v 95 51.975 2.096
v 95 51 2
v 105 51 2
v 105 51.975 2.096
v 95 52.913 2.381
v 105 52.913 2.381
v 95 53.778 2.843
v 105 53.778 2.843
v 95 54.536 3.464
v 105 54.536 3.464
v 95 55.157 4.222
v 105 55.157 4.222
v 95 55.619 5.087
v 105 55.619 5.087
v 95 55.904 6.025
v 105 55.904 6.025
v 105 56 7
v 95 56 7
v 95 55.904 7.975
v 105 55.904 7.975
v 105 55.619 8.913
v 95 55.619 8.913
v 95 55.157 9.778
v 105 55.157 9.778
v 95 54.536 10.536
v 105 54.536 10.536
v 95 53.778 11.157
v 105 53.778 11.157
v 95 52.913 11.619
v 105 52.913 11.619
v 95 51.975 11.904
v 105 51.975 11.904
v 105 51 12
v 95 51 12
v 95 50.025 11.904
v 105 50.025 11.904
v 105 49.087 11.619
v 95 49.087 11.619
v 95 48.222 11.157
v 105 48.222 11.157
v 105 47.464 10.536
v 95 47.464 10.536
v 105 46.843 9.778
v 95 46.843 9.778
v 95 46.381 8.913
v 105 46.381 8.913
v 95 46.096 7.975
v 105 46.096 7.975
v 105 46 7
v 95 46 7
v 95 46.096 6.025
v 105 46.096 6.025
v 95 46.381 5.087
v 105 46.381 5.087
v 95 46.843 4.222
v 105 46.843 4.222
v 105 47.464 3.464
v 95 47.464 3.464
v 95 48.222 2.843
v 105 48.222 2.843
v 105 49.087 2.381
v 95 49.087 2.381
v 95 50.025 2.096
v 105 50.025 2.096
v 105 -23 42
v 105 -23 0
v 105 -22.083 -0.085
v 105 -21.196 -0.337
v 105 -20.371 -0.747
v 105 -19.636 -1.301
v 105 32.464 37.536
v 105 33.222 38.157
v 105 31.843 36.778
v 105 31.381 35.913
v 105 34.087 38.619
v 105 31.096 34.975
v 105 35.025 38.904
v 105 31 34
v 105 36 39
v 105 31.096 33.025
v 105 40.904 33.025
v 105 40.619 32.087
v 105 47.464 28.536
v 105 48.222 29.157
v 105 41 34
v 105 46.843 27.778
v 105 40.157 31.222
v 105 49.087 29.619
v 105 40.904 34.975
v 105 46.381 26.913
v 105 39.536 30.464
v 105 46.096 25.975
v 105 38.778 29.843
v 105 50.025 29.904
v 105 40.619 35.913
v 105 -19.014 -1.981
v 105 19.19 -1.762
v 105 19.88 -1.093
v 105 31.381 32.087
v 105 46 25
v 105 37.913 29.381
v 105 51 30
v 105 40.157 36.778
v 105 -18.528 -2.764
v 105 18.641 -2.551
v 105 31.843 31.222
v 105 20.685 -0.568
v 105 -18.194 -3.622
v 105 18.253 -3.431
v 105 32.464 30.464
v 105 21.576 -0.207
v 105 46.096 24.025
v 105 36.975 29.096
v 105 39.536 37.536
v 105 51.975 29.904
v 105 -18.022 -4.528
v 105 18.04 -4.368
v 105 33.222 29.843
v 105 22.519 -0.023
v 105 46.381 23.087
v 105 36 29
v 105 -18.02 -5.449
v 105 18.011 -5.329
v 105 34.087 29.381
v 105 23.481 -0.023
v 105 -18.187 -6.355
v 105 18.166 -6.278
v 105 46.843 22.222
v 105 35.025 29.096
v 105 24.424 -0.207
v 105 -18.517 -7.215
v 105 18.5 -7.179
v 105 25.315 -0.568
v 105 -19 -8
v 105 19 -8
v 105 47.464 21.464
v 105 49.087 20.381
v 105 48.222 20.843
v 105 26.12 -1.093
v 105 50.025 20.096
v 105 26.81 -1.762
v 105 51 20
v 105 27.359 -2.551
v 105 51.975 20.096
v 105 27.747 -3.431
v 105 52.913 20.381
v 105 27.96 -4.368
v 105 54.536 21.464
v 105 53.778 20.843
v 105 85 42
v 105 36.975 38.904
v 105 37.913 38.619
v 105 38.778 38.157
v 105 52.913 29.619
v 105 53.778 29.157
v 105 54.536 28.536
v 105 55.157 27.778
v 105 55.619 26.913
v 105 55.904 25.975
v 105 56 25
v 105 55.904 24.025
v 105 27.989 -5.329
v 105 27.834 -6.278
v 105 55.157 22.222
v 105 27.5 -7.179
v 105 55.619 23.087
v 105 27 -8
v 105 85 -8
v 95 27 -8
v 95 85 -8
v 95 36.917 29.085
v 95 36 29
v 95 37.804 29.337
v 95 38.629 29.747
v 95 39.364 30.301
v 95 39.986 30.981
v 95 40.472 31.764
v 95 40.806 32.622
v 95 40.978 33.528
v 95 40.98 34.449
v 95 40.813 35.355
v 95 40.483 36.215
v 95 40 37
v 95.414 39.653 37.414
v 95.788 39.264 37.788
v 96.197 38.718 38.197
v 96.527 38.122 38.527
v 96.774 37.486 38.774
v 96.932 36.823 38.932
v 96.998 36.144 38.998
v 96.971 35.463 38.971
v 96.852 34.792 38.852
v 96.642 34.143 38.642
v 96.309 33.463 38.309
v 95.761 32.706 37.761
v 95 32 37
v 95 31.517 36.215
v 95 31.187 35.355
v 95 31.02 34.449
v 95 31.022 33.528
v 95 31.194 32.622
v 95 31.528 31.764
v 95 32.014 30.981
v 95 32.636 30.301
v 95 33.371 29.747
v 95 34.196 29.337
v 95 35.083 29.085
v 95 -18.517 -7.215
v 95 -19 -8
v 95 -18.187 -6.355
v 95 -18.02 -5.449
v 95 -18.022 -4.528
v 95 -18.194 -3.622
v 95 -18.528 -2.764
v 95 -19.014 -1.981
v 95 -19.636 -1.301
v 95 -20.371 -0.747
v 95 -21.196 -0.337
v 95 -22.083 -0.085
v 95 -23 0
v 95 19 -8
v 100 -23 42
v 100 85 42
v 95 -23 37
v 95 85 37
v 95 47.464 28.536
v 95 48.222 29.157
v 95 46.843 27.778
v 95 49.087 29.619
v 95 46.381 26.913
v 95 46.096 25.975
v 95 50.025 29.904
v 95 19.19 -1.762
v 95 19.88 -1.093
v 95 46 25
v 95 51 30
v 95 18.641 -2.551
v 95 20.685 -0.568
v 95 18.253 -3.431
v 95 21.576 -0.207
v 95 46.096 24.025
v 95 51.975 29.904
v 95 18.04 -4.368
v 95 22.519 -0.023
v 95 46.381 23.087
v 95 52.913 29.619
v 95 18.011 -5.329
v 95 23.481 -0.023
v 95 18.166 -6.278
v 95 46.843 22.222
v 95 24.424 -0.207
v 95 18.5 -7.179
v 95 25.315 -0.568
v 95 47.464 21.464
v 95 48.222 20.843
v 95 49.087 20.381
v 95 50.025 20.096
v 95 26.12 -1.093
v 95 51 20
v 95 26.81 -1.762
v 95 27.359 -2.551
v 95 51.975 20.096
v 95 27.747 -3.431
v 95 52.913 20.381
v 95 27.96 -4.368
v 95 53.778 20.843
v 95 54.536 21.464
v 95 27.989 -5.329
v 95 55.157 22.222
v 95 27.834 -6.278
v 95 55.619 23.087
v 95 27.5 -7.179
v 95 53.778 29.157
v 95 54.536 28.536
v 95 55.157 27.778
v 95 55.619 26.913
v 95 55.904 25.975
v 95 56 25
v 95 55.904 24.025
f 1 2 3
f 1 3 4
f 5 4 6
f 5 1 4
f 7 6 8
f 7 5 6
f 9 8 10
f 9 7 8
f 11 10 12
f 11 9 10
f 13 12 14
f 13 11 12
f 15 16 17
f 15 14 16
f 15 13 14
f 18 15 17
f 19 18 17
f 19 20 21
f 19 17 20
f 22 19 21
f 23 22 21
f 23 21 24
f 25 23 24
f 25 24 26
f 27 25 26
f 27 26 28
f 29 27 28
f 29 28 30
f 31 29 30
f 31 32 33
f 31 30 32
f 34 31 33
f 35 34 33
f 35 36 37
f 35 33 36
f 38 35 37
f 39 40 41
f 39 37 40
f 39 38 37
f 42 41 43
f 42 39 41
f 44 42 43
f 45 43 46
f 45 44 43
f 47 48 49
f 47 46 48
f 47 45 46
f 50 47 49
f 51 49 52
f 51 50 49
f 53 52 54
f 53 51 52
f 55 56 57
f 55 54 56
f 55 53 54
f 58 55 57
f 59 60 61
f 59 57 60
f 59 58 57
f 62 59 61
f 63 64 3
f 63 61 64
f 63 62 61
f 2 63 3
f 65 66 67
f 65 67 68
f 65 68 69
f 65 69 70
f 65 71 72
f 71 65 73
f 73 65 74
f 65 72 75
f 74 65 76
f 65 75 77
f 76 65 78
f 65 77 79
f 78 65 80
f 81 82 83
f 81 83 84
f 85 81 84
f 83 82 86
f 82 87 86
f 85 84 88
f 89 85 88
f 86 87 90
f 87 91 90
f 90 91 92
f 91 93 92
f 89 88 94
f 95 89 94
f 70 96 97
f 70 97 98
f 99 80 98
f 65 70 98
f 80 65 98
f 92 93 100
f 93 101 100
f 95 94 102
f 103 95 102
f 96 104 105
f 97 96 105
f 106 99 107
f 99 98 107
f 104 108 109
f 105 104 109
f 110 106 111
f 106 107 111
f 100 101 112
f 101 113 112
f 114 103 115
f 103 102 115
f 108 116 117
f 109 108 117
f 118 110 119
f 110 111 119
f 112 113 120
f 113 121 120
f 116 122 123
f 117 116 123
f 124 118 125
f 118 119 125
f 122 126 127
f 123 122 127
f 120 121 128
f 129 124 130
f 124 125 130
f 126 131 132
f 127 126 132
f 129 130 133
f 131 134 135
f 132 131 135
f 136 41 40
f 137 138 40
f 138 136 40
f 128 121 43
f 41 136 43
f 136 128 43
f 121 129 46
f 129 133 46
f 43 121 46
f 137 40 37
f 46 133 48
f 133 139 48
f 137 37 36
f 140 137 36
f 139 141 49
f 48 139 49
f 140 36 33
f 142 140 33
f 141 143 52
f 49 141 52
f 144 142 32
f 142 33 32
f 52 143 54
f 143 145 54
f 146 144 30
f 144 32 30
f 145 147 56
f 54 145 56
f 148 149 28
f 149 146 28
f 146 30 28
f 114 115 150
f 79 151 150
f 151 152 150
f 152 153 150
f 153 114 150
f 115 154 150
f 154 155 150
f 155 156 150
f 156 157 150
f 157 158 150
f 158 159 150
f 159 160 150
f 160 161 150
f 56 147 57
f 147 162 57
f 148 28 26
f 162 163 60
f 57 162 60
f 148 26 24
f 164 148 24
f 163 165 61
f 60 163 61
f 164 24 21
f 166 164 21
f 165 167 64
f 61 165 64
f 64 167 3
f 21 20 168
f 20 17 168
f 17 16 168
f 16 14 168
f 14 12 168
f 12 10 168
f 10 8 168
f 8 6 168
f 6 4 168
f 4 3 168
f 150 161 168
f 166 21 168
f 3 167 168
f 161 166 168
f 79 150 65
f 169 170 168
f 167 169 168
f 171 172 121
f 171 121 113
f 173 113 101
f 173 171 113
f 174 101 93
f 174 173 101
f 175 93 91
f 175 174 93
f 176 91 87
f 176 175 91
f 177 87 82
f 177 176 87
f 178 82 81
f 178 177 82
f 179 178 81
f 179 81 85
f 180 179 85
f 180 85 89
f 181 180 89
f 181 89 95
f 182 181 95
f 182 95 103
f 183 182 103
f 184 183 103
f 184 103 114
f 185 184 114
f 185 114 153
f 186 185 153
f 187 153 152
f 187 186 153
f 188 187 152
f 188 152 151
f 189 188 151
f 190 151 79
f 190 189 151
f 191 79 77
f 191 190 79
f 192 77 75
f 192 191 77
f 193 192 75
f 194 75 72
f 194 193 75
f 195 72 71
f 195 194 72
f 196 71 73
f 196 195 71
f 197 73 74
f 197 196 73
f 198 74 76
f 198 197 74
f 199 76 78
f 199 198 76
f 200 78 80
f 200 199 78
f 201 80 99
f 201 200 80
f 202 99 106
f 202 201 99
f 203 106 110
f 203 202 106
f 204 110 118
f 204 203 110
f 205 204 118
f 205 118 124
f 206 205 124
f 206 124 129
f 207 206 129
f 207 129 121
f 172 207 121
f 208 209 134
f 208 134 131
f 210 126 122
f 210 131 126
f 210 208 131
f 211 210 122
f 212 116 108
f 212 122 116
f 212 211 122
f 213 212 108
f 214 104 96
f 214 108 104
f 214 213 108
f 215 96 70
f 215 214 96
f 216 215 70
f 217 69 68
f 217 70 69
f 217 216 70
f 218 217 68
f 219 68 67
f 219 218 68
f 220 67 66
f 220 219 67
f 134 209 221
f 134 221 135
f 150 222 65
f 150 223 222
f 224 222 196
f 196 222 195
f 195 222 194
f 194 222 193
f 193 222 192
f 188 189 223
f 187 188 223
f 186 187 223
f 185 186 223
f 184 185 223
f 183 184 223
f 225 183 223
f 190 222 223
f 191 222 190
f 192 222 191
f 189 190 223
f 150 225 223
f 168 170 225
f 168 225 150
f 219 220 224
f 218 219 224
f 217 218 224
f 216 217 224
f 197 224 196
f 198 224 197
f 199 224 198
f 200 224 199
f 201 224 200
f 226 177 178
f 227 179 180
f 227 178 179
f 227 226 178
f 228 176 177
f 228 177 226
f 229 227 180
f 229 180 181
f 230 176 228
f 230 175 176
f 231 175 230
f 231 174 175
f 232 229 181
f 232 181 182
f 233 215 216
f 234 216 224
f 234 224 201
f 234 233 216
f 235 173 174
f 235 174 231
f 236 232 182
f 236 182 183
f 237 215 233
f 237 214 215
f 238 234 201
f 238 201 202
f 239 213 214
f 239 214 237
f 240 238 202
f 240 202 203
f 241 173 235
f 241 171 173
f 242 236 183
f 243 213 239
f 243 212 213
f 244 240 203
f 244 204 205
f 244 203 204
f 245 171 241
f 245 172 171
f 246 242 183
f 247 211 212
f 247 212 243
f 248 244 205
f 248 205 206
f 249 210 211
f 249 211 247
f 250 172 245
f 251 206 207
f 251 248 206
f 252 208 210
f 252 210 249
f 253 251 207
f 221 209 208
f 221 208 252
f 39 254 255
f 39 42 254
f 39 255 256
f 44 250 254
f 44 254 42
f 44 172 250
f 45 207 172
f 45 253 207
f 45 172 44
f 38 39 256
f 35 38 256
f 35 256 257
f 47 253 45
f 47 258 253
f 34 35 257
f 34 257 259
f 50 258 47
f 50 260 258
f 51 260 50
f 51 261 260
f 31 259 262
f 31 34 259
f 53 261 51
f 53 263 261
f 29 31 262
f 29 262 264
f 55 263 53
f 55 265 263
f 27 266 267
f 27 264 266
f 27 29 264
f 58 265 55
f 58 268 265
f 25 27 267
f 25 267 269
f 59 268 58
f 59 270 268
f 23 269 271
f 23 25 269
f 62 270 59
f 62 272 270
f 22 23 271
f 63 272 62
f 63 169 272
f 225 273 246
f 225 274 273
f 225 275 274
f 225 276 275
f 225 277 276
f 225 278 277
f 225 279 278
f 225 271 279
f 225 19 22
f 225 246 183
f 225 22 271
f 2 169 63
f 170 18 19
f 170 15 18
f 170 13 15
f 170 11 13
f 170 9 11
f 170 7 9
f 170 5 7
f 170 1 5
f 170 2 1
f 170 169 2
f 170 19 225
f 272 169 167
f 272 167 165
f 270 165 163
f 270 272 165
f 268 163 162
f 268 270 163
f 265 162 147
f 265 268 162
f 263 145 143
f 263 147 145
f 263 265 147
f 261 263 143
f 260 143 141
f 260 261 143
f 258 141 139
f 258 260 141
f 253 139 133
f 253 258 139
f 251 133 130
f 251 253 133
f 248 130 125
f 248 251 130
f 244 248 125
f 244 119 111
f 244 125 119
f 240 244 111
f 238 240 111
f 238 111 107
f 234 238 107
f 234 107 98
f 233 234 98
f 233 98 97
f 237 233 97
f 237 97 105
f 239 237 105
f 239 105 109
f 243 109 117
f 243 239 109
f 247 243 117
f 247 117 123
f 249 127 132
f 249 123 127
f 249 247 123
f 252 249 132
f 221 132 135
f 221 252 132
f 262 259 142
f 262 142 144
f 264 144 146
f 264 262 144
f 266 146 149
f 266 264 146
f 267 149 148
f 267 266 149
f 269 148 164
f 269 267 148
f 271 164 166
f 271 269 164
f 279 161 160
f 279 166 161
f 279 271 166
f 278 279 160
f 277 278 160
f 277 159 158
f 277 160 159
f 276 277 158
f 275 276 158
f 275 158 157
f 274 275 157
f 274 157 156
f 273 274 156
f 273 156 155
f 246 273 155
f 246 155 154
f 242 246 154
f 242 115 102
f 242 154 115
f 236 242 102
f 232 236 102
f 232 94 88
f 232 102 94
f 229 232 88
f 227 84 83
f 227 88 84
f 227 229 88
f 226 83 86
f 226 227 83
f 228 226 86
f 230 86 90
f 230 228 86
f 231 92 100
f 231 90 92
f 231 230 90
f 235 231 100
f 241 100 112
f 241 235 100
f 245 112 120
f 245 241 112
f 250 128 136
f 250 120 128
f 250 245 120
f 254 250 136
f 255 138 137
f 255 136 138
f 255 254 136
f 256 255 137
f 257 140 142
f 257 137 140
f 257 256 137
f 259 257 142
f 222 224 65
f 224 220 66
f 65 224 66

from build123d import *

# Parameters (mm, degrees)
CYLINDER455_R     = 5
CYLINDER455_DEPTH = 100
CYLINDER449_R     = 5
CYLINDER449_DEPTH = 100
CYLINDER457_R     = 5
CYLINDER457_DEPTH = 100
CYLINDER456_R     = 5
CYLINDER456_DEPTH = 100
CYLINDER450_R     = 5
CYLINDER450_DEPTH = 100
CYLINDER458_R     = 5
CYLINDER458_DEPTH = 100
CYLINDER451_R     = 5
CYLINDER451_DEPTH = 100
CYLINDER448_R     = 5
CYLINDER448_DEPTH = 100
BOX197_W          = 10
BOX197_H          = 108
BOX197_DEPTH      = 50
CHAMFER001_SIZE   = 5


with BuildPart() as v_lec455:
    # Cylinder455 → Cylinder455 (new body)
    with BuildSketch(Plane(origin=(24, -51, 25), x_dir=(0, 0, -1), z_dir=(1, 0, 0))):
        Circle(CYLINDER455_R)
    extrude(amount=CYLINDER455_DEPTH)


with BuildPart() as v_lec449:
    # Cylinder449 → Cylinder449 (new body)
    with BuildSketch(Plane(origin=(24, 36, 34), x_dir=(0, 0, -1), z_dir=(1, 0, 0))):
        Circle(CYLINDER449_R)
    extrude(amount=CYLINDER449_DEPTH)


with BuildPart() as v_lec457:
    # Cylinder457 → Cylinder457 (new body)
    with BuildSketch(Plane(origin=(24, -36, 34), x_dir=(0, 0, -1), z_dir=(1, 0, 0))):
        Circle(CYLINDER457_R)
    extrude(amount=CYLINDER457_DEPTH)


with BuildPart() as v_lec456:
    # Cylinder456 → Cylinder456 (new body)
    with BuildSketch(Plane(origin=(24, -23, -5), x_dir=(0, 0, -1), z_dir=(1, 0, 0))):
        Circle(CYLINDER456_R)
    extrude(amount=CYLINDER456_DEPTH)


with BuildPart() as v_lec450:
    # Cylinder450 → Cylinder450 (new body)
    with BuildSketch(Plane(origin=(24, 51, 7), x_dir=(0, 0, -1), z_dir=(1, 0, 0))):
        Circle(CYLINDER450_R)
    extrude(amount=CYLINDER450_DEPTH)


with BuildPart() as v_lec458:
    # Cylinder458 → Cylinder458 (new body)
    with BuildSketch(Plane(origin=(24, 23, -5), x_dir=(0, 0, -1), z_dir=(1, 0, 0))):
        Circle(CYLINDER458_R)
    extrude(amount=CYLINDER458_DEPTH)


with BuildPart() as v_lec451:
    # Cylinder451 → Cylinder451 (new body)
    with BuildSketch(Plane(origin=(24, -51, 7), x_dir=(0, 0, -1), z_dir=(1, 0, 0))):
        Circle(CYLINDER451_R)
    extrude(amount=CYLINDER451_DEPTH)


with BuildPart() as compound595:
    # Cylinder448 → Cylinder448 (new body)
    with BuildSketch(Plane(origin=(24, 51, 25), x_dir=(0, 0, -1), z_dir=(1, 0, 0))):
        Circle(CYLINDER448_R)
    extrude(amount=CYLINDER448_DEPTH)

    # Compound595: union Válec455, Válec449, Válec457, Válec456, Válec450, Válec458, Válec451
    add(v_lec455.part)
    add(v_lec449.part)
    add(v_lec457.part)
    add(v_lec456.part)
    add(v_lec450.part)
    add(v_lec458.part)
    add(v_lec451.part)


with BuildPart() as compound595_1:
    # Compound595 placement: moved
    add(compound595.part.moved(Location((32, 0, 0))))


with BuildPart() as cut369:
    # Box197 → Box197 (new body)
    with BuildSketch(Plane(origin=(87, -29, -8), x_dir=(1, 0, 0), z_dir=(0, 0, 1))):
        with Locations((5, 54)):
            Rectangle(BOX197_W, BOX197_H)
    extrude(amount=BOX197_DEPTH)

    # Chamfer001
    chamfer001_edges = [cut369.edges().sort_by_distance(p)[0] for p in [
        (87, 25, 42),
    ]]
    chamfer(chamfer001_edges, length=CHAMFER001_SIZE)


with BuildPart() as cut369_1:
    # Chamfer001 placement: moved
    add(cut369.part.moved(Location((8, 6, 0))))

    # Cut369: cut Compound595
    add(compound595_1.part, mode=Mode.SUBTRACT)


solid = cut369_1.part
